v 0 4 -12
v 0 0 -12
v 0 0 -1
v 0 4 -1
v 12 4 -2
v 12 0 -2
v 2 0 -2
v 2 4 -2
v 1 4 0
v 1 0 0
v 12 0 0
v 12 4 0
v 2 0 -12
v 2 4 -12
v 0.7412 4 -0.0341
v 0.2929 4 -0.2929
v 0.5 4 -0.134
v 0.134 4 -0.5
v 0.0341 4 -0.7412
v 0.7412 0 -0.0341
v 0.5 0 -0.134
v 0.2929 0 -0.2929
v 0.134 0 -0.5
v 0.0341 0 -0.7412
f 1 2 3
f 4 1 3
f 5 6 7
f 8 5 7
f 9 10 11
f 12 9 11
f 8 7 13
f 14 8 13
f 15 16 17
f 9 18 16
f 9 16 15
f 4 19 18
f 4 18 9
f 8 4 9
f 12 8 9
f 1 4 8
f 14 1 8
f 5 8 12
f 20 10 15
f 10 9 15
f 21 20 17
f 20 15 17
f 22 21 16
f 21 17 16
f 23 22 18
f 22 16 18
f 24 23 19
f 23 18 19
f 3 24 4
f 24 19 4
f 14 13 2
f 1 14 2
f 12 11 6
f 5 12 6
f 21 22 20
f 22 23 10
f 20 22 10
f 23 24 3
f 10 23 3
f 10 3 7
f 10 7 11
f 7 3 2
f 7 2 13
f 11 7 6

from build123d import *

# Parameters (mm, degrees)
BOSS_EXTRUDE1_DEPTH = 4
FILLET1_R           = 1


with BuildPart() as part:
    # Sketch1 → Boss-Extrude1 (new body)
    with BuildSketch(Plane(origin=(0, 0, 0), x_dir=(1, 0, 0), z_dir=(0, 1, 0))):
        Polygon((0, 0), (12, 0), (12, 2), (2, 2), (2, 12), (0, 12), align=None)
    extrude(amount=BOSS_EXTRUDE1_DEPTH)

    # Fillet1
    fillet1_edges = [part.edges().sort_by_distance(p)[0] for p in [
        (0, 2, 0),
    ]]
    fillet(fillet1_edges, radius=FILLET1_R)


solid = part.part
